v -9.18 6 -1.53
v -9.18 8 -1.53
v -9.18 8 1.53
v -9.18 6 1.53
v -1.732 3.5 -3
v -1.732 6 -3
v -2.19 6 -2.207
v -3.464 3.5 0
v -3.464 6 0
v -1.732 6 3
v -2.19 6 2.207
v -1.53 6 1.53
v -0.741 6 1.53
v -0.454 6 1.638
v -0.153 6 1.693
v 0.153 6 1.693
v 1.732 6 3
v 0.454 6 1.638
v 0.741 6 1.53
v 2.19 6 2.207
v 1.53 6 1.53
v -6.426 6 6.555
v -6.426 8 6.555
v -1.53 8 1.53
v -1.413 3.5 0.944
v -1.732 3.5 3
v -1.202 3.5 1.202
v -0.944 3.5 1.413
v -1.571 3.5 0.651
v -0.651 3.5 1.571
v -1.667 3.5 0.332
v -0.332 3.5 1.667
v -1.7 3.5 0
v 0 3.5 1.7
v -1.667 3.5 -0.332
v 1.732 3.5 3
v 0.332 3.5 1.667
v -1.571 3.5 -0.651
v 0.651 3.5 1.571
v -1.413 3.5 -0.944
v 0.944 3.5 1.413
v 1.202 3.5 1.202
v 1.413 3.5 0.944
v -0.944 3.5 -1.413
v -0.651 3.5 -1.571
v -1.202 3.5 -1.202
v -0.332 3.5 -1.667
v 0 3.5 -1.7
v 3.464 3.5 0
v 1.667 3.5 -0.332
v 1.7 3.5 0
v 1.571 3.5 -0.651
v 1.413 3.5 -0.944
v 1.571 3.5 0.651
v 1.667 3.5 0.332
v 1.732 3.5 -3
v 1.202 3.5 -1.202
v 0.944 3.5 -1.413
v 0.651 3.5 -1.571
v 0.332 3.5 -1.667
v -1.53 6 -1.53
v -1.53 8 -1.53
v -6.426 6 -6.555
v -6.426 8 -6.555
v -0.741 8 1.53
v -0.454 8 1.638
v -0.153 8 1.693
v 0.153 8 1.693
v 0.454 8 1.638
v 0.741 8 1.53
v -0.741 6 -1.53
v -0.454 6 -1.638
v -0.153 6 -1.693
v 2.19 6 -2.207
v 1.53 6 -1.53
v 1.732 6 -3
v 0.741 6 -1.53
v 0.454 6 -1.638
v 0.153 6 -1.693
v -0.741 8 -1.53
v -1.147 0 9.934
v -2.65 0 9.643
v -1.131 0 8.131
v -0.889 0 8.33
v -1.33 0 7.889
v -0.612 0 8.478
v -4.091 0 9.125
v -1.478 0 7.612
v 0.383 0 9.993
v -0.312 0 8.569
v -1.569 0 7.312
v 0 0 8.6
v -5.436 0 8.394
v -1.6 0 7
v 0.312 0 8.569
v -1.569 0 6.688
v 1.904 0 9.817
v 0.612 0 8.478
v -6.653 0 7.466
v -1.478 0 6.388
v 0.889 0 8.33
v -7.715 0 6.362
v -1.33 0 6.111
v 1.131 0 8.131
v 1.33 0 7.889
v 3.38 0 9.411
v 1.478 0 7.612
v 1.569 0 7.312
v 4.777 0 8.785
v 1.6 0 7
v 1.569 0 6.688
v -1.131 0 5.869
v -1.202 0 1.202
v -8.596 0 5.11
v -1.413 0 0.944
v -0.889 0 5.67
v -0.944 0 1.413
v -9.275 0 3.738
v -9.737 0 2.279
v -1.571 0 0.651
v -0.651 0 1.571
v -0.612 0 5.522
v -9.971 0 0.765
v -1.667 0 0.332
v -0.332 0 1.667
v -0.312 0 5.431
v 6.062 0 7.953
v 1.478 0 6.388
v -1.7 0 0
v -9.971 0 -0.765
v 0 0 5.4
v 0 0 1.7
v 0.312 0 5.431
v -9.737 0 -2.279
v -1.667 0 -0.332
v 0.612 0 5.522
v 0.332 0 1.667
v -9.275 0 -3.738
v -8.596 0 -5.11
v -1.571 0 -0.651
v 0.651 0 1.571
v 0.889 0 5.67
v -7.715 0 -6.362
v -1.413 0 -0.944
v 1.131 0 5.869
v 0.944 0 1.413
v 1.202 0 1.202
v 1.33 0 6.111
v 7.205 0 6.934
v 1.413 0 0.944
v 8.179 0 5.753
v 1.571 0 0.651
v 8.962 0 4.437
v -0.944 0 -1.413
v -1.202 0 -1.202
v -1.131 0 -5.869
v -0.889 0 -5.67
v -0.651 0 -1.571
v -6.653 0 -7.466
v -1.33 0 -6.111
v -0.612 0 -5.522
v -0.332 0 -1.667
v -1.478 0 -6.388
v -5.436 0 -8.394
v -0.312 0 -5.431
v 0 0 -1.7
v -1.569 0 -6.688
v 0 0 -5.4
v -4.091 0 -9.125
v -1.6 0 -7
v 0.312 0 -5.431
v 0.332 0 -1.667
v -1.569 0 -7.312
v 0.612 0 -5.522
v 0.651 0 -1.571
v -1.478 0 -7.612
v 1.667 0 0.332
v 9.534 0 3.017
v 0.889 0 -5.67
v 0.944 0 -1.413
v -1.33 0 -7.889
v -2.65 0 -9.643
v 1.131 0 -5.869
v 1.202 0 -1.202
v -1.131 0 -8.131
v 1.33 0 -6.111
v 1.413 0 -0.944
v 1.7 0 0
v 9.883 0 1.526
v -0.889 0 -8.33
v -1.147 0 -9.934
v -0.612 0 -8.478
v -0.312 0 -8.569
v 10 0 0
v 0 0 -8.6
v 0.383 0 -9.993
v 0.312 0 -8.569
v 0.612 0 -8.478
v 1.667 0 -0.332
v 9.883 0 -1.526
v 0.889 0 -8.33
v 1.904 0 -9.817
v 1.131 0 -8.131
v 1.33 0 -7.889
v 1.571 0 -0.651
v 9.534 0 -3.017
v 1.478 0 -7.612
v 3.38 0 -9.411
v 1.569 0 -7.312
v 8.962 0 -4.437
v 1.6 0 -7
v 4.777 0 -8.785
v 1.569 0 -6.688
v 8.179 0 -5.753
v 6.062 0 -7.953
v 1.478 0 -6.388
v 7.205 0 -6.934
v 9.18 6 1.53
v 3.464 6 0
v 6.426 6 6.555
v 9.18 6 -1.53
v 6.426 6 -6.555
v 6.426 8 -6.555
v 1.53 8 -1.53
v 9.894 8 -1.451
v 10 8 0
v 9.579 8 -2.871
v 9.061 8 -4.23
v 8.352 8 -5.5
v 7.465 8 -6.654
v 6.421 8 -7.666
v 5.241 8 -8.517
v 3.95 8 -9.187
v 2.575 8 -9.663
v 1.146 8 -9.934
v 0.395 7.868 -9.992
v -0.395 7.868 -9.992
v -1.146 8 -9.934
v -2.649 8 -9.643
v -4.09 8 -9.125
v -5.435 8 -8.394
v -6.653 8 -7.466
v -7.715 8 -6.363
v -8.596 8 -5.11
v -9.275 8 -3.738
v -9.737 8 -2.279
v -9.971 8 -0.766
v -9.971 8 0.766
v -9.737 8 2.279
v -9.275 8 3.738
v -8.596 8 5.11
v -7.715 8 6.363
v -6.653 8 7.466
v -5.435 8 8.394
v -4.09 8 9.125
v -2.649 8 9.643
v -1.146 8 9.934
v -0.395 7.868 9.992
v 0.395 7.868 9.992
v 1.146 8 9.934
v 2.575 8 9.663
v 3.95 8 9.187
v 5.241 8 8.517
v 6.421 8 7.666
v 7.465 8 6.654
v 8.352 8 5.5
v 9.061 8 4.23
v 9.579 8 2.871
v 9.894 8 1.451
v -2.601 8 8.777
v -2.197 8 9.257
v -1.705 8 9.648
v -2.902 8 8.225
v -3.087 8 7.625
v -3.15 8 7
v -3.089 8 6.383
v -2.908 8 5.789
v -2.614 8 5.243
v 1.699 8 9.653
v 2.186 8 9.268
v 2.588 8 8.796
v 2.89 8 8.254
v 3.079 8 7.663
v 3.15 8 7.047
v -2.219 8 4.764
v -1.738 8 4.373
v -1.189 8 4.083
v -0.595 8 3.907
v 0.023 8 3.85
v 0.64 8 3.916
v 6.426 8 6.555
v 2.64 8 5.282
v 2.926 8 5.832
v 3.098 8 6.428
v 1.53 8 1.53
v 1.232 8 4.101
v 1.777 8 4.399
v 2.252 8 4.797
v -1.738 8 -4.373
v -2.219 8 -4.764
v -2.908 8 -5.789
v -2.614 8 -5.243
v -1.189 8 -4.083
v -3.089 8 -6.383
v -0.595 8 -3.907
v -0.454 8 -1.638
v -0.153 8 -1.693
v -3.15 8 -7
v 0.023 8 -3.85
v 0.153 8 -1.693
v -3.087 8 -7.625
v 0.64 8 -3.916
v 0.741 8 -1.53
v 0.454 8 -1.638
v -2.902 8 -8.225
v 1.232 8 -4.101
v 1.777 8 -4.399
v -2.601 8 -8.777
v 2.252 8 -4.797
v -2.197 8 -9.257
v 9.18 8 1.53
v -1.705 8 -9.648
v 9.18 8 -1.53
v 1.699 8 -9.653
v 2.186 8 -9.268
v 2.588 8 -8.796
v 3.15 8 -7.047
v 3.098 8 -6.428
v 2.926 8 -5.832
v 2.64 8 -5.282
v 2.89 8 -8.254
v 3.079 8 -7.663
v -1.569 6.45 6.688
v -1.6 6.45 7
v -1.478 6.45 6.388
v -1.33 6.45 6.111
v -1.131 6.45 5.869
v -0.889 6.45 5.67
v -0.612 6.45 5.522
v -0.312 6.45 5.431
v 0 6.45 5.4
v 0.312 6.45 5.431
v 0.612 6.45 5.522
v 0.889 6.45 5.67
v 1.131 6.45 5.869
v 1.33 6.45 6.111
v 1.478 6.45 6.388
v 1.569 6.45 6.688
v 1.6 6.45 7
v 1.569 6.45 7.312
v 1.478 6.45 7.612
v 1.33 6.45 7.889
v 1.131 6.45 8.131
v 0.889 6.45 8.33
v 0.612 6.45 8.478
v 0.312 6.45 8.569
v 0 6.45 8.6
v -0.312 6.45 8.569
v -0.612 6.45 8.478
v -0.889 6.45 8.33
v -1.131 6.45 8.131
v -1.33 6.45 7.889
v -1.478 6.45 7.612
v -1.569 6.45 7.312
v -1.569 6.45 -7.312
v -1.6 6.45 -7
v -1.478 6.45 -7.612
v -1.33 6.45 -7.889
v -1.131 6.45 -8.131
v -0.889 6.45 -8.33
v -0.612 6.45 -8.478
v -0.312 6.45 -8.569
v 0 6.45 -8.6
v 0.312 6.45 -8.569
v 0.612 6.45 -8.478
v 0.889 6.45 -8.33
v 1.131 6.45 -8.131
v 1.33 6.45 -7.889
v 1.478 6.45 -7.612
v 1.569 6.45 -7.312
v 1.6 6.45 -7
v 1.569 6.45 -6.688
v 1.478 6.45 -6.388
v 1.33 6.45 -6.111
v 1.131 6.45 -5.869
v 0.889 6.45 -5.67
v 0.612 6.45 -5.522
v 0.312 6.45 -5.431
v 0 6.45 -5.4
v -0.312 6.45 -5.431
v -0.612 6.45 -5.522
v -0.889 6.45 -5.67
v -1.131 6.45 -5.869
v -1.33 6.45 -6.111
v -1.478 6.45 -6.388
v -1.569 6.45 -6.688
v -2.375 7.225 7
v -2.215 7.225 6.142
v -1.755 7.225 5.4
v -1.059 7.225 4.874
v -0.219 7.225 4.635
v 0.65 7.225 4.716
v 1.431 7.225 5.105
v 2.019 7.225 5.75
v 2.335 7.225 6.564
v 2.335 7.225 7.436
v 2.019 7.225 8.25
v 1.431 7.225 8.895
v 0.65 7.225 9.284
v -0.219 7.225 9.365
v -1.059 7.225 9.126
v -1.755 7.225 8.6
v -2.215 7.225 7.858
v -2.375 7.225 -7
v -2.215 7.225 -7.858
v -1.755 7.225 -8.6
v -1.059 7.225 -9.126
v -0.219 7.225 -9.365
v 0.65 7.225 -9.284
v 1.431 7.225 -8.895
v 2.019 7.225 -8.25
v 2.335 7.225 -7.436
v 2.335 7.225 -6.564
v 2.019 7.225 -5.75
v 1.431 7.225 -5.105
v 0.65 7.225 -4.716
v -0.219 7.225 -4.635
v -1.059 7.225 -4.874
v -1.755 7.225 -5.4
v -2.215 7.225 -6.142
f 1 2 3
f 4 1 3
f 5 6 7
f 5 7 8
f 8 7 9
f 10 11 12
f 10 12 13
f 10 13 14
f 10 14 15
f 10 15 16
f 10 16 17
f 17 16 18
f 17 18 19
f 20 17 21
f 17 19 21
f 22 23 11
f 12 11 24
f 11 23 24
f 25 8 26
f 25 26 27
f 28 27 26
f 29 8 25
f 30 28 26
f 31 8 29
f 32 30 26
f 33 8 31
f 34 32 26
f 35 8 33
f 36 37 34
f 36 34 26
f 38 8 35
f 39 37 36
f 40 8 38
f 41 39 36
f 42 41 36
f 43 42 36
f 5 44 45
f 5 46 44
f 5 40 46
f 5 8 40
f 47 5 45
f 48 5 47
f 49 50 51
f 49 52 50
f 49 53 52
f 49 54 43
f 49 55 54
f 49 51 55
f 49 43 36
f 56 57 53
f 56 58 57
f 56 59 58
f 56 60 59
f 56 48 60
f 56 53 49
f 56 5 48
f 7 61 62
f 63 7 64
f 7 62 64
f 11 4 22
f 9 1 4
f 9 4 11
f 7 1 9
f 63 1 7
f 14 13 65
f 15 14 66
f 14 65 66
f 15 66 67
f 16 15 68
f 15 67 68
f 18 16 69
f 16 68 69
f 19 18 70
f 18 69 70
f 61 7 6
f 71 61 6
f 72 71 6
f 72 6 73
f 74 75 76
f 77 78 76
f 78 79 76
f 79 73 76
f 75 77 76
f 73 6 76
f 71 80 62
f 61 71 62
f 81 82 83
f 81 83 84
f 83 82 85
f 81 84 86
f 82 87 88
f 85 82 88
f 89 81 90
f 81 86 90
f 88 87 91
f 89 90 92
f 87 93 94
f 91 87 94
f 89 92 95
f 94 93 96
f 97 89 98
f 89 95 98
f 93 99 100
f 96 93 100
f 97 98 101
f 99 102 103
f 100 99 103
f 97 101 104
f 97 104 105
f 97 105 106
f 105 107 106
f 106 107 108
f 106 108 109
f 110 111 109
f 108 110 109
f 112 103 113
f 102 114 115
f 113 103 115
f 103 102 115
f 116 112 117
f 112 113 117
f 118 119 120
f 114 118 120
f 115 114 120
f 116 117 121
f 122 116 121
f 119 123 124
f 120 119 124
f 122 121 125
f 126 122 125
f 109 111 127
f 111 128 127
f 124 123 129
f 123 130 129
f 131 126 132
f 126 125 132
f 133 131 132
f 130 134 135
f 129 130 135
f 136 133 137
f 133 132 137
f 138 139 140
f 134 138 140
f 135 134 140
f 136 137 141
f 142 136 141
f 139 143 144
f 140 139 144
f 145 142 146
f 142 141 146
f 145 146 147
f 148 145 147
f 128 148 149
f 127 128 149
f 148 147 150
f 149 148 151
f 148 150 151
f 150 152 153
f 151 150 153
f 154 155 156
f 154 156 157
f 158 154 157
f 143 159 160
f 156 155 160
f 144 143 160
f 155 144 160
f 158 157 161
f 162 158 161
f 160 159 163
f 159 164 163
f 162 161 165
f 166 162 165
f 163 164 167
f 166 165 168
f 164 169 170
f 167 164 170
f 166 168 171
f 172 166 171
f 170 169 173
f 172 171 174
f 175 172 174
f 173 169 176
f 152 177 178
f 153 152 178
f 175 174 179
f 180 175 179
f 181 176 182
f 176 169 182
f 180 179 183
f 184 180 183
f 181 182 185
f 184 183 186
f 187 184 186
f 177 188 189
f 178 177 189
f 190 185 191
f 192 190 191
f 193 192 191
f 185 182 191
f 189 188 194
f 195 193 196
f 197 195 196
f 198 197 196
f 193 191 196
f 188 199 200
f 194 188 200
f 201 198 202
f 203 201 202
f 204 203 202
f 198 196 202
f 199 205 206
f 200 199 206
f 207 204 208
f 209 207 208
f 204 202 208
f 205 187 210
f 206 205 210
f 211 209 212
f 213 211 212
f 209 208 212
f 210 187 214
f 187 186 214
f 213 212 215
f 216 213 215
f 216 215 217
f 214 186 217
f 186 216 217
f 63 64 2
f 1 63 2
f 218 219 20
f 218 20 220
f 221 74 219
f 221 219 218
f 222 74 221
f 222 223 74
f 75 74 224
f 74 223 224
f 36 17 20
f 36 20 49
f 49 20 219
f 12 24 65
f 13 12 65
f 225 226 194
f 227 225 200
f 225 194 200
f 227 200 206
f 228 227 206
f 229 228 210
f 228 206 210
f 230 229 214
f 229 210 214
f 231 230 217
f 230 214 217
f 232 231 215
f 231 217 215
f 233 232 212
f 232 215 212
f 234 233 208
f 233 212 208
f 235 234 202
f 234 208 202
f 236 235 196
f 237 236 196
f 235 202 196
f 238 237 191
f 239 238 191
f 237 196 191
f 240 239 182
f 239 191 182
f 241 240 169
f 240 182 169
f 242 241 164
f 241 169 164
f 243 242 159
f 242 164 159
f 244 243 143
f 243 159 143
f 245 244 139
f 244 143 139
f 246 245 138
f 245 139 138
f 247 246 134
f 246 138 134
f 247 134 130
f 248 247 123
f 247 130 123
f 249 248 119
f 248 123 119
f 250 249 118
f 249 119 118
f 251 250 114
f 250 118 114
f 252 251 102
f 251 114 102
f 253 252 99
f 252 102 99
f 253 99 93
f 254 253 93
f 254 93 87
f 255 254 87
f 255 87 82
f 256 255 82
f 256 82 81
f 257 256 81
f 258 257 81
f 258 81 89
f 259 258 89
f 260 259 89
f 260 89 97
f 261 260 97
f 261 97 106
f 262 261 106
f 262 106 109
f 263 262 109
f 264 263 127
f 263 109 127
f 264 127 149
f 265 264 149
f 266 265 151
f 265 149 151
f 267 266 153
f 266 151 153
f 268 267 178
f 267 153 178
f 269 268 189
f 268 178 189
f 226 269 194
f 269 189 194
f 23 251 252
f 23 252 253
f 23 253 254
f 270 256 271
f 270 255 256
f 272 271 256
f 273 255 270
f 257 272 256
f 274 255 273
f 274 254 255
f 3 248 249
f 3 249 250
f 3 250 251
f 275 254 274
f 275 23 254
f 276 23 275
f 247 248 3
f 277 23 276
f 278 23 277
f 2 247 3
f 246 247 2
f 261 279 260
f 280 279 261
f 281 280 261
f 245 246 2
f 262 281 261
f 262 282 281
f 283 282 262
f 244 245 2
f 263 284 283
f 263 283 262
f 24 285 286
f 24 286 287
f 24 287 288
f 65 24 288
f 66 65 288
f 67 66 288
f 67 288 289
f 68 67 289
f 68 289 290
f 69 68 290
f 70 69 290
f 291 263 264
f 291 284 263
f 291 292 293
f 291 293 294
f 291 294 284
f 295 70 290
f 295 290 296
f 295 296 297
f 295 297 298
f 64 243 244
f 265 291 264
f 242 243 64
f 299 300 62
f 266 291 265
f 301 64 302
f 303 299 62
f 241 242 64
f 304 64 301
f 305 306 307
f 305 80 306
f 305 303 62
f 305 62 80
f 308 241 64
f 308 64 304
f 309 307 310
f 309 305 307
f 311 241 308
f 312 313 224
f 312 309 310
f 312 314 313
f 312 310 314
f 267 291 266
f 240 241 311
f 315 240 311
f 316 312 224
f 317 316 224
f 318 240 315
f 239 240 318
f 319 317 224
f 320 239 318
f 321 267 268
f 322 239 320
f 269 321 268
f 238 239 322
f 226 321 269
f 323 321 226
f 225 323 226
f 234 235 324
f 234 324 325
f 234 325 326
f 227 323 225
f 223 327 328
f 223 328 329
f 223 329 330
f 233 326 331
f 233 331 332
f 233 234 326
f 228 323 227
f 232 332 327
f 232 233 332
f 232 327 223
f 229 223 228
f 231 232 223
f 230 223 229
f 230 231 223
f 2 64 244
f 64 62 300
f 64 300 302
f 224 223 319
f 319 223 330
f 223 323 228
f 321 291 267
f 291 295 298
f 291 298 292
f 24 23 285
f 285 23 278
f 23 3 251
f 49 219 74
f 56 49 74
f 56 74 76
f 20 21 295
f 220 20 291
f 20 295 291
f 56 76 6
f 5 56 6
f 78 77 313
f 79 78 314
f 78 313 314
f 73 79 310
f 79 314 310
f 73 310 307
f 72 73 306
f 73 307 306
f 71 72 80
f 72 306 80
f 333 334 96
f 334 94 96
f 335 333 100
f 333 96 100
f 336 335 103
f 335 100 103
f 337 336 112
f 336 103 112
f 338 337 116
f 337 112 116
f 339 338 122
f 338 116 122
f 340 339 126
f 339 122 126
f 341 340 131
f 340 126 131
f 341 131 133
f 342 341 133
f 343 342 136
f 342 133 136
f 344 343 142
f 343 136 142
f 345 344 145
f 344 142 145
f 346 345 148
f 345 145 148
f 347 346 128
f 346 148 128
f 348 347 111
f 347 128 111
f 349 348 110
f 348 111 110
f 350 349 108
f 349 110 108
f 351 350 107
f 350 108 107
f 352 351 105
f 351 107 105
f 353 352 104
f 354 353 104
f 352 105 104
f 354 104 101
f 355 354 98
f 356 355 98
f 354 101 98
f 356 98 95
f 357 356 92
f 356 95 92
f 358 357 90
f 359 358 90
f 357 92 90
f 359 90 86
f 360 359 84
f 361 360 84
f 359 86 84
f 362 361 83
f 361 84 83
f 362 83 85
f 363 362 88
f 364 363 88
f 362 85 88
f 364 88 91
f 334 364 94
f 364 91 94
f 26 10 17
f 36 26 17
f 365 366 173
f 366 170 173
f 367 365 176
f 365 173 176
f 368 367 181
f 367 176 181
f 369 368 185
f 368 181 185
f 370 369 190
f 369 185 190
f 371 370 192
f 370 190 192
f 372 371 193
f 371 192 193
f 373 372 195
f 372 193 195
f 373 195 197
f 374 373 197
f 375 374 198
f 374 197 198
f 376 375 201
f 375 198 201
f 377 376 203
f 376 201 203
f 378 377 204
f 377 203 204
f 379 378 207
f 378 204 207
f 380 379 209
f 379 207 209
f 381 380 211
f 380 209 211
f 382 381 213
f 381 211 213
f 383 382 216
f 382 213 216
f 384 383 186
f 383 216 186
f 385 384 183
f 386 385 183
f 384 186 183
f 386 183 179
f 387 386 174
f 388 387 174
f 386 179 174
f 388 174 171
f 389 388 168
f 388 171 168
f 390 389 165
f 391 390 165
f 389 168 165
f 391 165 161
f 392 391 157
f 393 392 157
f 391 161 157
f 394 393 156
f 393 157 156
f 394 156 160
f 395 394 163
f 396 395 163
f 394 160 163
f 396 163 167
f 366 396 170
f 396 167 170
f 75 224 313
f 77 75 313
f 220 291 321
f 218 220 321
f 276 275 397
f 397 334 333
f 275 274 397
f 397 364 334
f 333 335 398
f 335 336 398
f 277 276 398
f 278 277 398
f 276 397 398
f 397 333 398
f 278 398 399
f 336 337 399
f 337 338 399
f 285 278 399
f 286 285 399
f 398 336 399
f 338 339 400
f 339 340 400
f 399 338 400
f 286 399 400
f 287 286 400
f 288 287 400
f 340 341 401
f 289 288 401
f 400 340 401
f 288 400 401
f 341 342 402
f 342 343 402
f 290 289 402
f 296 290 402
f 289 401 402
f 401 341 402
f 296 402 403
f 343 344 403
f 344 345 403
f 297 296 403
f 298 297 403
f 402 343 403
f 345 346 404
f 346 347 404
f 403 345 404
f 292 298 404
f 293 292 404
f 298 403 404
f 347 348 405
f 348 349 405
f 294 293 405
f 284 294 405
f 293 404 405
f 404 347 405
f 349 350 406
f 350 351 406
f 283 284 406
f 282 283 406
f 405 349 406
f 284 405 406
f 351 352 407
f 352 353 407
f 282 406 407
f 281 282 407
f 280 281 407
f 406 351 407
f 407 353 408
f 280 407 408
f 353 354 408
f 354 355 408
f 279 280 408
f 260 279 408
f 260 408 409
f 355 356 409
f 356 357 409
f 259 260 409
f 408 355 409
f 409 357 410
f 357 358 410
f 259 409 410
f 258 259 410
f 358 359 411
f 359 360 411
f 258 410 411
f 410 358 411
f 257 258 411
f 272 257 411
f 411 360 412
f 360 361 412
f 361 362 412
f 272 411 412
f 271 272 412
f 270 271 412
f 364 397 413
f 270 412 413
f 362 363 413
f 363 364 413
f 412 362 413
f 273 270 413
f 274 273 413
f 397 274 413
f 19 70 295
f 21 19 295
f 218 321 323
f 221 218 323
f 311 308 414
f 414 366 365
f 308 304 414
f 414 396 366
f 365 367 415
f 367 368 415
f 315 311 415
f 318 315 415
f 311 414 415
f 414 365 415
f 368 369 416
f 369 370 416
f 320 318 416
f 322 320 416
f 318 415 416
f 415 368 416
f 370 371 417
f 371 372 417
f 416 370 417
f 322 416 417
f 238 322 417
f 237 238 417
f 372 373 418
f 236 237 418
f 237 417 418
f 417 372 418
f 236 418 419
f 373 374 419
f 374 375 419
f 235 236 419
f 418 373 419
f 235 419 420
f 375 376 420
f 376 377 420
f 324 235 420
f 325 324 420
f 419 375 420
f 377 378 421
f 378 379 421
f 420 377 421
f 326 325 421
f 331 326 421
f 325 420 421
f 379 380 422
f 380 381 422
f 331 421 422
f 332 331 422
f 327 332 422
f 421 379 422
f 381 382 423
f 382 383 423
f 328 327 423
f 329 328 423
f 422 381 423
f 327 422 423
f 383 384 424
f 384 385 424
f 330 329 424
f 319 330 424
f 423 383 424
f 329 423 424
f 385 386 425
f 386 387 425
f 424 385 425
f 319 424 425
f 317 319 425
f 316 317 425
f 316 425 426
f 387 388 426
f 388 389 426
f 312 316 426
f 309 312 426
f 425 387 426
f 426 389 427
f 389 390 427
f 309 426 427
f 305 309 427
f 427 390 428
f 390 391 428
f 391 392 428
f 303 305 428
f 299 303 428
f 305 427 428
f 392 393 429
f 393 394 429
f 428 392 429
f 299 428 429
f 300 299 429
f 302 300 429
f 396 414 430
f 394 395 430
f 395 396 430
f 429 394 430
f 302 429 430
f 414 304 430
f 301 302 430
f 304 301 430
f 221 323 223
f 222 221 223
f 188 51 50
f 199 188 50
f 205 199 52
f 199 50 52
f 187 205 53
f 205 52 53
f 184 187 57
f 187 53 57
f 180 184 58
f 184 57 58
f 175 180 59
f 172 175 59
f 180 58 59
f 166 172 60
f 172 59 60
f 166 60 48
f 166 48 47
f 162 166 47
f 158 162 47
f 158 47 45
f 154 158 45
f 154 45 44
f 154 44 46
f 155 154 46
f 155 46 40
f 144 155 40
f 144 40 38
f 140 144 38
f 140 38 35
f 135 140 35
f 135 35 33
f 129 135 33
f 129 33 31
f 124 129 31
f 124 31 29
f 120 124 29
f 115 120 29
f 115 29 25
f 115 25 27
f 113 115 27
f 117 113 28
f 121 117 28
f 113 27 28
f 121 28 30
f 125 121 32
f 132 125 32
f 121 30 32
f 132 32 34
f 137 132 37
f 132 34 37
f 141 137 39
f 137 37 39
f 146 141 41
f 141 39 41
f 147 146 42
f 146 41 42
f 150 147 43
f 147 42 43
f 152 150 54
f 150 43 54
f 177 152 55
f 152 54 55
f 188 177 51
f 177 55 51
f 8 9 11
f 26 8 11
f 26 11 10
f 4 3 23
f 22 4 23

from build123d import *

# Parameters (mm, degrees)
SKETCH1_R                                           = 10
BOSS_EXTRUDE1_DEPTH                                 = 6
CUT_EXTRUDE4_DEPTH                                  = 2.5
SKETCH9_R                                           = 10
BOSS_EXTRUDE2_DEPTH                                 = 2
CSK_FOR_M3_COUNTERSUNK_FLAT_HEAD_SCREW2_D           = 3.2
CSK_FOR_M3_COUNTERSUNK_FLAT_HEAD_SCREW2_CSINK_D     = 6.3
CSK_FOR_M3_COUNTERSUNK_FLAT_HEAD_SCREW2_CSINK_ANGLE = 90
CUT_EXTRUDE6_DEPTH                                  = 2
SKETCH18_R                                          = 1.7
CUT_EXTRUDE8_DEPTH                                  = 9


with BuildPart() as part:
    # Sketch1 → Boss-Extrude1 (new body)
    with BuildSketch(Plane(origin=(0, 0, 0), x_dir=(1, 0, 0), z_dir=(0, 1, 0))):
        Circle(SKETCH1_R)
    extrude(amount=BOSS_EXTRUDE1_DEPTH)

    # Sketch8 → Cut-Extrude4 (cut)
    with BuildSketch(Plane(origin=(0, 6, 0), x_dir=(1, 0, 0), z_dir=(0, 1, 0))):
        Polygon((3.464101615, 0), (1.732050808, 3), (-1.732050808, 3), (-3.464101615, 0), (-1.732050808, -3), (1.732050808, -3), align=None)
    extrude(amount=-CUT_EXTRUDE4_DEPTH, mode=Mode.SUBTRACT)

    # Sketch9 → Boss-Extrude2 (add)
    with BuildSketch(Plane(origin=(0, 6, 0), x_dir=(1, 0, 0), z_dir=(0, 1, 0))):
        Circle(SKETCH9_R)
    extrude(amount=BOSS_EXTRUDE2_DEPTH)

    # CSK for M3 Countersunk Flat Head Screw2 (through all)
    with Locations(Plane(origin=(0, 8, 0), x_dir=(1, 0, 0), z_dir=(0, 1, 0))):
        with Locations((0, 7), (0, -7)):
            CounterSinkHole(CSK_FOR_M3_COUNTERSUNK_FLAT_HEAD_SCREW2_D / 2, CSK_FOR_M3_COUNTERSUNK_FLAT_HEAD_SCREW2_CSINK_D / 2, counter_sink_angle=CSK_FOR_M3_COUNTERSUNK_FLAT_HEAD_SCREW2_CSINK_ANGLE)

    # Sketch16 → Cut-Extrude6 (cut)
    with BuildSketch(Plane(origin=(0, 8, 0), x_dir=(1, 0, 0), z_dir=(0, 1, 0))):
        Polygon((-6.426401471, 6.555437753), (-9.18, 1.53), (-9.18, -1.53), (-6.426401471, -6.555437753), (-1.53, -1.53), (1.53, -1.53), (6.426401471, -6.555437753), (9.18, -1.53), (9.18, 1.53), (6.426401471, 6.555437753), (1.53, 1.53), (-1.53, 1.53), align=None)
    extrude(amount=-CUT_EXTRUDE6_DEPTH, mode=Mode.SUBTRACT)

    # Sketch18 → Cut-Extrude8 (cut)
    with BuildSketch(Plane(origin=(0, 8, 0), x_dir=(1, 0, 0), z_dir=(0, 1, 0))):
        Circle(SKETCH18_R)
    extrude(amount=-CUT_EXTRUDE8_DEPTH, mode=Mode.SUBTRACT)


solid = part.part
